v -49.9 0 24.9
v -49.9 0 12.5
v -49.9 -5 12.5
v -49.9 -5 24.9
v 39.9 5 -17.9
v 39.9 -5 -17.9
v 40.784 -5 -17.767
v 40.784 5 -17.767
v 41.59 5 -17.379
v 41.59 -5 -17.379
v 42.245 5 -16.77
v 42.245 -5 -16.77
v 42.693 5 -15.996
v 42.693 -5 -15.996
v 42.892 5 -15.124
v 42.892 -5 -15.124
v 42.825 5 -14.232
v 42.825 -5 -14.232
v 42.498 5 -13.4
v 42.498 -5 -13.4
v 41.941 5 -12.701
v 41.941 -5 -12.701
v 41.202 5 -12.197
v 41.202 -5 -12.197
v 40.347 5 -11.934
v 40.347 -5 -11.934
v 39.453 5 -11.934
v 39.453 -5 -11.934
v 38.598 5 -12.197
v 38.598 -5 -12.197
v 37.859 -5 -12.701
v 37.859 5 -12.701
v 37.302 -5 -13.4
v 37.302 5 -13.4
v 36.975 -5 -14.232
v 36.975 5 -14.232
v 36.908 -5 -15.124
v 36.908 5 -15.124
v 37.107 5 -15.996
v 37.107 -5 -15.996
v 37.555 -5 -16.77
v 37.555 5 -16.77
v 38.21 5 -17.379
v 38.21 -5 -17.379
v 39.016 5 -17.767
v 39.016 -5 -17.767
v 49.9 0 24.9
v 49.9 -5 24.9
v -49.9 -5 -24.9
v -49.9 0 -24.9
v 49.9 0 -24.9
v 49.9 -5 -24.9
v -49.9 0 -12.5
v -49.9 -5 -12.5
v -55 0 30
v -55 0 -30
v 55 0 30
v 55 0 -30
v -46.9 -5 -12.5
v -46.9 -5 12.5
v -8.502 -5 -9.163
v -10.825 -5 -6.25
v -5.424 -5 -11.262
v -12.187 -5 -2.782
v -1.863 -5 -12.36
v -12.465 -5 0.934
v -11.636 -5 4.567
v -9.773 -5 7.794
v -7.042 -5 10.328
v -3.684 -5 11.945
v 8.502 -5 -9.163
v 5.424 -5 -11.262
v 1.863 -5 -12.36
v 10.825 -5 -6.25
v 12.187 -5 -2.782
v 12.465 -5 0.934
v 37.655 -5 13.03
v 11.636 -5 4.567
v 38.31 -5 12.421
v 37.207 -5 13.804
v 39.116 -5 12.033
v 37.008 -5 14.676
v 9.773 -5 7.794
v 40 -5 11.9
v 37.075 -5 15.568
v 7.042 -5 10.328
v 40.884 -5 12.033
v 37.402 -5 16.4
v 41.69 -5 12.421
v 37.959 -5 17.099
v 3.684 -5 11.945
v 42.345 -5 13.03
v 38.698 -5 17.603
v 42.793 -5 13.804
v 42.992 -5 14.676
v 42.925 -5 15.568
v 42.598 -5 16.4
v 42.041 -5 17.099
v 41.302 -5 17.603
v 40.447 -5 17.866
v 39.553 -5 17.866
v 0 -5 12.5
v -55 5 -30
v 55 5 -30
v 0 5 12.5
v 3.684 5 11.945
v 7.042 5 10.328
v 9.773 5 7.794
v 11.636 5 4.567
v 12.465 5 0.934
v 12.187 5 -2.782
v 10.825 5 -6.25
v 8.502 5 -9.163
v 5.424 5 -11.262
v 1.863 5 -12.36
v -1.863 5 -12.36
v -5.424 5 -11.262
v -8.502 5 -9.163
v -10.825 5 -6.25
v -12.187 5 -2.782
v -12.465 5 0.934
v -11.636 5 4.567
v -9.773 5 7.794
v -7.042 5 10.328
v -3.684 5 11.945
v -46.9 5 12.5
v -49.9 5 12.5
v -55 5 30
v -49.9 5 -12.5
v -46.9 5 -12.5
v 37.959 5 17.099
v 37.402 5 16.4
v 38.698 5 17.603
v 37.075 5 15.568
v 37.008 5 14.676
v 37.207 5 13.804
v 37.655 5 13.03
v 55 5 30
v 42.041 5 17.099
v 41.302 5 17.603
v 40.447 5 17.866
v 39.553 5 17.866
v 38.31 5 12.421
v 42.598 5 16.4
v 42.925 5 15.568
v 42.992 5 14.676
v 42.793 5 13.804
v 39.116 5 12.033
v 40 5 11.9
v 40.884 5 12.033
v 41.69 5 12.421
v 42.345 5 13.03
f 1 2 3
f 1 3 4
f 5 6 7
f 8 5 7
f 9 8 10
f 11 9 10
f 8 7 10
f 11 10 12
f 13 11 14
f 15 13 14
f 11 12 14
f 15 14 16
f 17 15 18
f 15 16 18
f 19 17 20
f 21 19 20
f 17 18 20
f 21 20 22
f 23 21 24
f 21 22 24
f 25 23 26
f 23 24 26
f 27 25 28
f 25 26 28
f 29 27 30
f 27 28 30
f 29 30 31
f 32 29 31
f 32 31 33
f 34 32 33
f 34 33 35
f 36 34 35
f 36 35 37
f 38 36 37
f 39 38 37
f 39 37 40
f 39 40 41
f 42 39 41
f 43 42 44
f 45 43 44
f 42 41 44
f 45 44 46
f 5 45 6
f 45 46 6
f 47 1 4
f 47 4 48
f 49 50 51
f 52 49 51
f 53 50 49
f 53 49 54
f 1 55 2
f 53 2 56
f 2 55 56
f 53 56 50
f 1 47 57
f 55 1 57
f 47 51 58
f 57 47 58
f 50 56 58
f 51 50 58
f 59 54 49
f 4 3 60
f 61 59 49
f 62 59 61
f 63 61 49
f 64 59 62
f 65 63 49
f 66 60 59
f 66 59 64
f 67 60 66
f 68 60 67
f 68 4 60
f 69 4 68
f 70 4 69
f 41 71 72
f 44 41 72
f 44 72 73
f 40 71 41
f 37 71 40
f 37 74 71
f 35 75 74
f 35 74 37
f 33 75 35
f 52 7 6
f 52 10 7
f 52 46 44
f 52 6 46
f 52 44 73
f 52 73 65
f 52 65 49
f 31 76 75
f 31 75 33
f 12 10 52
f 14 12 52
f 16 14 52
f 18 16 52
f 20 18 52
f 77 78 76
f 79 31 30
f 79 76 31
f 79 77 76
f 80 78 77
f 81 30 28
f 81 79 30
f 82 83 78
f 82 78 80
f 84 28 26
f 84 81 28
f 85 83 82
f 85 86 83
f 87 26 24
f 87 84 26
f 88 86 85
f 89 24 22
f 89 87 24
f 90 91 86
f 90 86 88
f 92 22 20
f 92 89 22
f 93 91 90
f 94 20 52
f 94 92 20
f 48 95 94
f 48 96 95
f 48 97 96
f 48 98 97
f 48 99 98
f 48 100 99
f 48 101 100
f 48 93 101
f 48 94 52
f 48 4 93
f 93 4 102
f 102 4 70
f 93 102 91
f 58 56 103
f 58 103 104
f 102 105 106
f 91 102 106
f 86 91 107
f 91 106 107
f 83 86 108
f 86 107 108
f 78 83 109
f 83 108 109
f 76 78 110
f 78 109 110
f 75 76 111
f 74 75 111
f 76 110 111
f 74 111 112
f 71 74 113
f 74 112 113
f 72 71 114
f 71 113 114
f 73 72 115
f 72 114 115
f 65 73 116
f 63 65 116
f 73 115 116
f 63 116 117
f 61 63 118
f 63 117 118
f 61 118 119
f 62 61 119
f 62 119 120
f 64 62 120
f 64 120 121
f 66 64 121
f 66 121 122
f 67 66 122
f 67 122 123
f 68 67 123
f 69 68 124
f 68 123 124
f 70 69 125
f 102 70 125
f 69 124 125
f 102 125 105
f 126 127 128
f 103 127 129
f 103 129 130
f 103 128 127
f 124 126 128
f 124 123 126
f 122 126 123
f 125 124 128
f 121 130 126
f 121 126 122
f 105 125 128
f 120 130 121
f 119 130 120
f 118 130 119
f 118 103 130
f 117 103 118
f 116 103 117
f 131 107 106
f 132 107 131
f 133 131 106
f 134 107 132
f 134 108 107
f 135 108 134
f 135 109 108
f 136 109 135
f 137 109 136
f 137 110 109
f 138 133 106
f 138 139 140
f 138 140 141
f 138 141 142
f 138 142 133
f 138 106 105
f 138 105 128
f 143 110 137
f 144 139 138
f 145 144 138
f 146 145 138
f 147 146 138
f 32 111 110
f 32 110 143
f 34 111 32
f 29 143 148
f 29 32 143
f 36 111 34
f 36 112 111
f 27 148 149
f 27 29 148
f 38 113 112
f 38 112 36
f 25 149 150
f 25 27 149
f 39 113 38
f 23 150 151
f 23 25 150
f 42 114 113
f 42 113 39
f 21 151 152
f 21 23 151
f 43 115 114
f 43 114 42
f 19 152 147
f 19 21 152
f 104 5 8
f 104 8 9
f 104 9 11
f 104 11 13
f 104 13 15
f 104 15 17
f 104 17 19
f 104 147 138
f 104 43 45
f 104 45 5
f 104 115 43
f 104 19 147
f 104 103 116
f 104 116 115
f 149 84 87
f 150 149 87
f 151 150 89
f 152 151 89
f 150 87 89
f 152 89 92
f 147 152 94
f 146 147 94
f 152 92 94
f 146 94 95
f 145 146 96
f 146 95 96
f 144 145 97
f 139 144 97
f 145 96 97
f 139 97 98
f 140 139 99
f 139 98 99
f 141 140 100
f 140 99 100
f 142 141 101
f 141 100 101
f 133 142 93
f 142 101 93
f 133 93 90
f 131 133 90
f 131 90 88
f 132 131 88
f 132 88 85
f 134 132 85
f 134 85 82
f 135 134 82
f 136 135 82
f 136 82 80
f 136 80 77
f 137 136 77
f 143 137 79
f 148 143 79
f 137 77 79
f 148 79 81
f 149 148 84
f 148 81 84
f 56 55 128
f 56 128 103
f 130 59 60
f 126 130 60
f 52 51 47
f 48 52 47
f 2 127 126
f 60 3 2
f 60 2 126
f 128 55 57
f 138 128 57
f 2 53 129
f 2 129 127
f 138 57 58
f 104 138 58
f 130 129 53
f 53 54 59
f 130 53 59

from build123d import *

# Parameters (mm, degrees)
SKETCH1_W           = 110
SKETCH1_H           = 60
BOSS_EXTRUDE1_DEPTH = 5
SKETCH2_W           = 99.8
SKETCH2_H           = 49.8
BOSS_EXTRUDE2_DEPTH = 5
SKETCH3_W           = 3
SKETCH3_H           = 25
CUT_EXTRUDE2_DEPTH  = 10
SKETCH5_R           = 3
CUT_EXTRUDE3_DEPTH  = 10
SKETCH6_R           = 12.5
CUT_EXTRUDE4_DEPTH  = 10


with BuildPart() as part:
    # Sketch1 → Boss-Extrude1 (new body)
    with BuildSketch(Plane(origin=(0, 0, 0), x_dir=(1, 0, 0), z_dir=(0, 1, 0))):
        Rectangle(SKETCH1_W, SKETCH1_H)
    extrude(amount=BOSS_EXTRUDE1_DEPTH)

    # Sketch2 → Boss-Extrude2 (add)
    with BuildSketch(Plane.XZ):
        Rectangle(SKETCH2_W, SKETCH2_H)
    extrude(amount=BOSS_EXTRUDE2_DEPTH)

    # Sketch3 → Cut-Extrude2 (cut)
    with BuildSketch(Plane.XZ.offset(5)):
        with Locations((-48.4, 0)):
            Rectangle(SKETCH3_W, SKETCH3_H)
    extrude(amount=-CUT_EXTRUDE2_DEPTH, mode=Mode.SUBTRACT)

    # Sketch5 → Cut-Extrude3 (cut)
    with BuildSketch(Plane.XZ.offset(5)):
        with Locations(Location((39.9, -14.9, 0), (0, 0, 270))):
            Circle(SKETCH5_R)
        with Locations(Location((40, 14.9, 0), (0, 0, 270))):
            Circle(SKETCH5_R)
    extrude(amount=-CUT_EXTRUDE3_DEPTH, mode=Mode.SUBTRACT)

    # Sketch6 → Cut-Extrude4 (cut)
    with BuildSketch(Plane(origin=(0, 5, 0), x_dir=(1, 0, 0), z_dir=(0, 1, 0))):
        with Locations(Location((0, 0, 0), (0, 0, 270))):
            Circle(SKETCH6_R)
    extrude(amount=-CUT_EXTRUDE4_DEPTH, mode=Mode.SUBTRACT)


solid = part.part
